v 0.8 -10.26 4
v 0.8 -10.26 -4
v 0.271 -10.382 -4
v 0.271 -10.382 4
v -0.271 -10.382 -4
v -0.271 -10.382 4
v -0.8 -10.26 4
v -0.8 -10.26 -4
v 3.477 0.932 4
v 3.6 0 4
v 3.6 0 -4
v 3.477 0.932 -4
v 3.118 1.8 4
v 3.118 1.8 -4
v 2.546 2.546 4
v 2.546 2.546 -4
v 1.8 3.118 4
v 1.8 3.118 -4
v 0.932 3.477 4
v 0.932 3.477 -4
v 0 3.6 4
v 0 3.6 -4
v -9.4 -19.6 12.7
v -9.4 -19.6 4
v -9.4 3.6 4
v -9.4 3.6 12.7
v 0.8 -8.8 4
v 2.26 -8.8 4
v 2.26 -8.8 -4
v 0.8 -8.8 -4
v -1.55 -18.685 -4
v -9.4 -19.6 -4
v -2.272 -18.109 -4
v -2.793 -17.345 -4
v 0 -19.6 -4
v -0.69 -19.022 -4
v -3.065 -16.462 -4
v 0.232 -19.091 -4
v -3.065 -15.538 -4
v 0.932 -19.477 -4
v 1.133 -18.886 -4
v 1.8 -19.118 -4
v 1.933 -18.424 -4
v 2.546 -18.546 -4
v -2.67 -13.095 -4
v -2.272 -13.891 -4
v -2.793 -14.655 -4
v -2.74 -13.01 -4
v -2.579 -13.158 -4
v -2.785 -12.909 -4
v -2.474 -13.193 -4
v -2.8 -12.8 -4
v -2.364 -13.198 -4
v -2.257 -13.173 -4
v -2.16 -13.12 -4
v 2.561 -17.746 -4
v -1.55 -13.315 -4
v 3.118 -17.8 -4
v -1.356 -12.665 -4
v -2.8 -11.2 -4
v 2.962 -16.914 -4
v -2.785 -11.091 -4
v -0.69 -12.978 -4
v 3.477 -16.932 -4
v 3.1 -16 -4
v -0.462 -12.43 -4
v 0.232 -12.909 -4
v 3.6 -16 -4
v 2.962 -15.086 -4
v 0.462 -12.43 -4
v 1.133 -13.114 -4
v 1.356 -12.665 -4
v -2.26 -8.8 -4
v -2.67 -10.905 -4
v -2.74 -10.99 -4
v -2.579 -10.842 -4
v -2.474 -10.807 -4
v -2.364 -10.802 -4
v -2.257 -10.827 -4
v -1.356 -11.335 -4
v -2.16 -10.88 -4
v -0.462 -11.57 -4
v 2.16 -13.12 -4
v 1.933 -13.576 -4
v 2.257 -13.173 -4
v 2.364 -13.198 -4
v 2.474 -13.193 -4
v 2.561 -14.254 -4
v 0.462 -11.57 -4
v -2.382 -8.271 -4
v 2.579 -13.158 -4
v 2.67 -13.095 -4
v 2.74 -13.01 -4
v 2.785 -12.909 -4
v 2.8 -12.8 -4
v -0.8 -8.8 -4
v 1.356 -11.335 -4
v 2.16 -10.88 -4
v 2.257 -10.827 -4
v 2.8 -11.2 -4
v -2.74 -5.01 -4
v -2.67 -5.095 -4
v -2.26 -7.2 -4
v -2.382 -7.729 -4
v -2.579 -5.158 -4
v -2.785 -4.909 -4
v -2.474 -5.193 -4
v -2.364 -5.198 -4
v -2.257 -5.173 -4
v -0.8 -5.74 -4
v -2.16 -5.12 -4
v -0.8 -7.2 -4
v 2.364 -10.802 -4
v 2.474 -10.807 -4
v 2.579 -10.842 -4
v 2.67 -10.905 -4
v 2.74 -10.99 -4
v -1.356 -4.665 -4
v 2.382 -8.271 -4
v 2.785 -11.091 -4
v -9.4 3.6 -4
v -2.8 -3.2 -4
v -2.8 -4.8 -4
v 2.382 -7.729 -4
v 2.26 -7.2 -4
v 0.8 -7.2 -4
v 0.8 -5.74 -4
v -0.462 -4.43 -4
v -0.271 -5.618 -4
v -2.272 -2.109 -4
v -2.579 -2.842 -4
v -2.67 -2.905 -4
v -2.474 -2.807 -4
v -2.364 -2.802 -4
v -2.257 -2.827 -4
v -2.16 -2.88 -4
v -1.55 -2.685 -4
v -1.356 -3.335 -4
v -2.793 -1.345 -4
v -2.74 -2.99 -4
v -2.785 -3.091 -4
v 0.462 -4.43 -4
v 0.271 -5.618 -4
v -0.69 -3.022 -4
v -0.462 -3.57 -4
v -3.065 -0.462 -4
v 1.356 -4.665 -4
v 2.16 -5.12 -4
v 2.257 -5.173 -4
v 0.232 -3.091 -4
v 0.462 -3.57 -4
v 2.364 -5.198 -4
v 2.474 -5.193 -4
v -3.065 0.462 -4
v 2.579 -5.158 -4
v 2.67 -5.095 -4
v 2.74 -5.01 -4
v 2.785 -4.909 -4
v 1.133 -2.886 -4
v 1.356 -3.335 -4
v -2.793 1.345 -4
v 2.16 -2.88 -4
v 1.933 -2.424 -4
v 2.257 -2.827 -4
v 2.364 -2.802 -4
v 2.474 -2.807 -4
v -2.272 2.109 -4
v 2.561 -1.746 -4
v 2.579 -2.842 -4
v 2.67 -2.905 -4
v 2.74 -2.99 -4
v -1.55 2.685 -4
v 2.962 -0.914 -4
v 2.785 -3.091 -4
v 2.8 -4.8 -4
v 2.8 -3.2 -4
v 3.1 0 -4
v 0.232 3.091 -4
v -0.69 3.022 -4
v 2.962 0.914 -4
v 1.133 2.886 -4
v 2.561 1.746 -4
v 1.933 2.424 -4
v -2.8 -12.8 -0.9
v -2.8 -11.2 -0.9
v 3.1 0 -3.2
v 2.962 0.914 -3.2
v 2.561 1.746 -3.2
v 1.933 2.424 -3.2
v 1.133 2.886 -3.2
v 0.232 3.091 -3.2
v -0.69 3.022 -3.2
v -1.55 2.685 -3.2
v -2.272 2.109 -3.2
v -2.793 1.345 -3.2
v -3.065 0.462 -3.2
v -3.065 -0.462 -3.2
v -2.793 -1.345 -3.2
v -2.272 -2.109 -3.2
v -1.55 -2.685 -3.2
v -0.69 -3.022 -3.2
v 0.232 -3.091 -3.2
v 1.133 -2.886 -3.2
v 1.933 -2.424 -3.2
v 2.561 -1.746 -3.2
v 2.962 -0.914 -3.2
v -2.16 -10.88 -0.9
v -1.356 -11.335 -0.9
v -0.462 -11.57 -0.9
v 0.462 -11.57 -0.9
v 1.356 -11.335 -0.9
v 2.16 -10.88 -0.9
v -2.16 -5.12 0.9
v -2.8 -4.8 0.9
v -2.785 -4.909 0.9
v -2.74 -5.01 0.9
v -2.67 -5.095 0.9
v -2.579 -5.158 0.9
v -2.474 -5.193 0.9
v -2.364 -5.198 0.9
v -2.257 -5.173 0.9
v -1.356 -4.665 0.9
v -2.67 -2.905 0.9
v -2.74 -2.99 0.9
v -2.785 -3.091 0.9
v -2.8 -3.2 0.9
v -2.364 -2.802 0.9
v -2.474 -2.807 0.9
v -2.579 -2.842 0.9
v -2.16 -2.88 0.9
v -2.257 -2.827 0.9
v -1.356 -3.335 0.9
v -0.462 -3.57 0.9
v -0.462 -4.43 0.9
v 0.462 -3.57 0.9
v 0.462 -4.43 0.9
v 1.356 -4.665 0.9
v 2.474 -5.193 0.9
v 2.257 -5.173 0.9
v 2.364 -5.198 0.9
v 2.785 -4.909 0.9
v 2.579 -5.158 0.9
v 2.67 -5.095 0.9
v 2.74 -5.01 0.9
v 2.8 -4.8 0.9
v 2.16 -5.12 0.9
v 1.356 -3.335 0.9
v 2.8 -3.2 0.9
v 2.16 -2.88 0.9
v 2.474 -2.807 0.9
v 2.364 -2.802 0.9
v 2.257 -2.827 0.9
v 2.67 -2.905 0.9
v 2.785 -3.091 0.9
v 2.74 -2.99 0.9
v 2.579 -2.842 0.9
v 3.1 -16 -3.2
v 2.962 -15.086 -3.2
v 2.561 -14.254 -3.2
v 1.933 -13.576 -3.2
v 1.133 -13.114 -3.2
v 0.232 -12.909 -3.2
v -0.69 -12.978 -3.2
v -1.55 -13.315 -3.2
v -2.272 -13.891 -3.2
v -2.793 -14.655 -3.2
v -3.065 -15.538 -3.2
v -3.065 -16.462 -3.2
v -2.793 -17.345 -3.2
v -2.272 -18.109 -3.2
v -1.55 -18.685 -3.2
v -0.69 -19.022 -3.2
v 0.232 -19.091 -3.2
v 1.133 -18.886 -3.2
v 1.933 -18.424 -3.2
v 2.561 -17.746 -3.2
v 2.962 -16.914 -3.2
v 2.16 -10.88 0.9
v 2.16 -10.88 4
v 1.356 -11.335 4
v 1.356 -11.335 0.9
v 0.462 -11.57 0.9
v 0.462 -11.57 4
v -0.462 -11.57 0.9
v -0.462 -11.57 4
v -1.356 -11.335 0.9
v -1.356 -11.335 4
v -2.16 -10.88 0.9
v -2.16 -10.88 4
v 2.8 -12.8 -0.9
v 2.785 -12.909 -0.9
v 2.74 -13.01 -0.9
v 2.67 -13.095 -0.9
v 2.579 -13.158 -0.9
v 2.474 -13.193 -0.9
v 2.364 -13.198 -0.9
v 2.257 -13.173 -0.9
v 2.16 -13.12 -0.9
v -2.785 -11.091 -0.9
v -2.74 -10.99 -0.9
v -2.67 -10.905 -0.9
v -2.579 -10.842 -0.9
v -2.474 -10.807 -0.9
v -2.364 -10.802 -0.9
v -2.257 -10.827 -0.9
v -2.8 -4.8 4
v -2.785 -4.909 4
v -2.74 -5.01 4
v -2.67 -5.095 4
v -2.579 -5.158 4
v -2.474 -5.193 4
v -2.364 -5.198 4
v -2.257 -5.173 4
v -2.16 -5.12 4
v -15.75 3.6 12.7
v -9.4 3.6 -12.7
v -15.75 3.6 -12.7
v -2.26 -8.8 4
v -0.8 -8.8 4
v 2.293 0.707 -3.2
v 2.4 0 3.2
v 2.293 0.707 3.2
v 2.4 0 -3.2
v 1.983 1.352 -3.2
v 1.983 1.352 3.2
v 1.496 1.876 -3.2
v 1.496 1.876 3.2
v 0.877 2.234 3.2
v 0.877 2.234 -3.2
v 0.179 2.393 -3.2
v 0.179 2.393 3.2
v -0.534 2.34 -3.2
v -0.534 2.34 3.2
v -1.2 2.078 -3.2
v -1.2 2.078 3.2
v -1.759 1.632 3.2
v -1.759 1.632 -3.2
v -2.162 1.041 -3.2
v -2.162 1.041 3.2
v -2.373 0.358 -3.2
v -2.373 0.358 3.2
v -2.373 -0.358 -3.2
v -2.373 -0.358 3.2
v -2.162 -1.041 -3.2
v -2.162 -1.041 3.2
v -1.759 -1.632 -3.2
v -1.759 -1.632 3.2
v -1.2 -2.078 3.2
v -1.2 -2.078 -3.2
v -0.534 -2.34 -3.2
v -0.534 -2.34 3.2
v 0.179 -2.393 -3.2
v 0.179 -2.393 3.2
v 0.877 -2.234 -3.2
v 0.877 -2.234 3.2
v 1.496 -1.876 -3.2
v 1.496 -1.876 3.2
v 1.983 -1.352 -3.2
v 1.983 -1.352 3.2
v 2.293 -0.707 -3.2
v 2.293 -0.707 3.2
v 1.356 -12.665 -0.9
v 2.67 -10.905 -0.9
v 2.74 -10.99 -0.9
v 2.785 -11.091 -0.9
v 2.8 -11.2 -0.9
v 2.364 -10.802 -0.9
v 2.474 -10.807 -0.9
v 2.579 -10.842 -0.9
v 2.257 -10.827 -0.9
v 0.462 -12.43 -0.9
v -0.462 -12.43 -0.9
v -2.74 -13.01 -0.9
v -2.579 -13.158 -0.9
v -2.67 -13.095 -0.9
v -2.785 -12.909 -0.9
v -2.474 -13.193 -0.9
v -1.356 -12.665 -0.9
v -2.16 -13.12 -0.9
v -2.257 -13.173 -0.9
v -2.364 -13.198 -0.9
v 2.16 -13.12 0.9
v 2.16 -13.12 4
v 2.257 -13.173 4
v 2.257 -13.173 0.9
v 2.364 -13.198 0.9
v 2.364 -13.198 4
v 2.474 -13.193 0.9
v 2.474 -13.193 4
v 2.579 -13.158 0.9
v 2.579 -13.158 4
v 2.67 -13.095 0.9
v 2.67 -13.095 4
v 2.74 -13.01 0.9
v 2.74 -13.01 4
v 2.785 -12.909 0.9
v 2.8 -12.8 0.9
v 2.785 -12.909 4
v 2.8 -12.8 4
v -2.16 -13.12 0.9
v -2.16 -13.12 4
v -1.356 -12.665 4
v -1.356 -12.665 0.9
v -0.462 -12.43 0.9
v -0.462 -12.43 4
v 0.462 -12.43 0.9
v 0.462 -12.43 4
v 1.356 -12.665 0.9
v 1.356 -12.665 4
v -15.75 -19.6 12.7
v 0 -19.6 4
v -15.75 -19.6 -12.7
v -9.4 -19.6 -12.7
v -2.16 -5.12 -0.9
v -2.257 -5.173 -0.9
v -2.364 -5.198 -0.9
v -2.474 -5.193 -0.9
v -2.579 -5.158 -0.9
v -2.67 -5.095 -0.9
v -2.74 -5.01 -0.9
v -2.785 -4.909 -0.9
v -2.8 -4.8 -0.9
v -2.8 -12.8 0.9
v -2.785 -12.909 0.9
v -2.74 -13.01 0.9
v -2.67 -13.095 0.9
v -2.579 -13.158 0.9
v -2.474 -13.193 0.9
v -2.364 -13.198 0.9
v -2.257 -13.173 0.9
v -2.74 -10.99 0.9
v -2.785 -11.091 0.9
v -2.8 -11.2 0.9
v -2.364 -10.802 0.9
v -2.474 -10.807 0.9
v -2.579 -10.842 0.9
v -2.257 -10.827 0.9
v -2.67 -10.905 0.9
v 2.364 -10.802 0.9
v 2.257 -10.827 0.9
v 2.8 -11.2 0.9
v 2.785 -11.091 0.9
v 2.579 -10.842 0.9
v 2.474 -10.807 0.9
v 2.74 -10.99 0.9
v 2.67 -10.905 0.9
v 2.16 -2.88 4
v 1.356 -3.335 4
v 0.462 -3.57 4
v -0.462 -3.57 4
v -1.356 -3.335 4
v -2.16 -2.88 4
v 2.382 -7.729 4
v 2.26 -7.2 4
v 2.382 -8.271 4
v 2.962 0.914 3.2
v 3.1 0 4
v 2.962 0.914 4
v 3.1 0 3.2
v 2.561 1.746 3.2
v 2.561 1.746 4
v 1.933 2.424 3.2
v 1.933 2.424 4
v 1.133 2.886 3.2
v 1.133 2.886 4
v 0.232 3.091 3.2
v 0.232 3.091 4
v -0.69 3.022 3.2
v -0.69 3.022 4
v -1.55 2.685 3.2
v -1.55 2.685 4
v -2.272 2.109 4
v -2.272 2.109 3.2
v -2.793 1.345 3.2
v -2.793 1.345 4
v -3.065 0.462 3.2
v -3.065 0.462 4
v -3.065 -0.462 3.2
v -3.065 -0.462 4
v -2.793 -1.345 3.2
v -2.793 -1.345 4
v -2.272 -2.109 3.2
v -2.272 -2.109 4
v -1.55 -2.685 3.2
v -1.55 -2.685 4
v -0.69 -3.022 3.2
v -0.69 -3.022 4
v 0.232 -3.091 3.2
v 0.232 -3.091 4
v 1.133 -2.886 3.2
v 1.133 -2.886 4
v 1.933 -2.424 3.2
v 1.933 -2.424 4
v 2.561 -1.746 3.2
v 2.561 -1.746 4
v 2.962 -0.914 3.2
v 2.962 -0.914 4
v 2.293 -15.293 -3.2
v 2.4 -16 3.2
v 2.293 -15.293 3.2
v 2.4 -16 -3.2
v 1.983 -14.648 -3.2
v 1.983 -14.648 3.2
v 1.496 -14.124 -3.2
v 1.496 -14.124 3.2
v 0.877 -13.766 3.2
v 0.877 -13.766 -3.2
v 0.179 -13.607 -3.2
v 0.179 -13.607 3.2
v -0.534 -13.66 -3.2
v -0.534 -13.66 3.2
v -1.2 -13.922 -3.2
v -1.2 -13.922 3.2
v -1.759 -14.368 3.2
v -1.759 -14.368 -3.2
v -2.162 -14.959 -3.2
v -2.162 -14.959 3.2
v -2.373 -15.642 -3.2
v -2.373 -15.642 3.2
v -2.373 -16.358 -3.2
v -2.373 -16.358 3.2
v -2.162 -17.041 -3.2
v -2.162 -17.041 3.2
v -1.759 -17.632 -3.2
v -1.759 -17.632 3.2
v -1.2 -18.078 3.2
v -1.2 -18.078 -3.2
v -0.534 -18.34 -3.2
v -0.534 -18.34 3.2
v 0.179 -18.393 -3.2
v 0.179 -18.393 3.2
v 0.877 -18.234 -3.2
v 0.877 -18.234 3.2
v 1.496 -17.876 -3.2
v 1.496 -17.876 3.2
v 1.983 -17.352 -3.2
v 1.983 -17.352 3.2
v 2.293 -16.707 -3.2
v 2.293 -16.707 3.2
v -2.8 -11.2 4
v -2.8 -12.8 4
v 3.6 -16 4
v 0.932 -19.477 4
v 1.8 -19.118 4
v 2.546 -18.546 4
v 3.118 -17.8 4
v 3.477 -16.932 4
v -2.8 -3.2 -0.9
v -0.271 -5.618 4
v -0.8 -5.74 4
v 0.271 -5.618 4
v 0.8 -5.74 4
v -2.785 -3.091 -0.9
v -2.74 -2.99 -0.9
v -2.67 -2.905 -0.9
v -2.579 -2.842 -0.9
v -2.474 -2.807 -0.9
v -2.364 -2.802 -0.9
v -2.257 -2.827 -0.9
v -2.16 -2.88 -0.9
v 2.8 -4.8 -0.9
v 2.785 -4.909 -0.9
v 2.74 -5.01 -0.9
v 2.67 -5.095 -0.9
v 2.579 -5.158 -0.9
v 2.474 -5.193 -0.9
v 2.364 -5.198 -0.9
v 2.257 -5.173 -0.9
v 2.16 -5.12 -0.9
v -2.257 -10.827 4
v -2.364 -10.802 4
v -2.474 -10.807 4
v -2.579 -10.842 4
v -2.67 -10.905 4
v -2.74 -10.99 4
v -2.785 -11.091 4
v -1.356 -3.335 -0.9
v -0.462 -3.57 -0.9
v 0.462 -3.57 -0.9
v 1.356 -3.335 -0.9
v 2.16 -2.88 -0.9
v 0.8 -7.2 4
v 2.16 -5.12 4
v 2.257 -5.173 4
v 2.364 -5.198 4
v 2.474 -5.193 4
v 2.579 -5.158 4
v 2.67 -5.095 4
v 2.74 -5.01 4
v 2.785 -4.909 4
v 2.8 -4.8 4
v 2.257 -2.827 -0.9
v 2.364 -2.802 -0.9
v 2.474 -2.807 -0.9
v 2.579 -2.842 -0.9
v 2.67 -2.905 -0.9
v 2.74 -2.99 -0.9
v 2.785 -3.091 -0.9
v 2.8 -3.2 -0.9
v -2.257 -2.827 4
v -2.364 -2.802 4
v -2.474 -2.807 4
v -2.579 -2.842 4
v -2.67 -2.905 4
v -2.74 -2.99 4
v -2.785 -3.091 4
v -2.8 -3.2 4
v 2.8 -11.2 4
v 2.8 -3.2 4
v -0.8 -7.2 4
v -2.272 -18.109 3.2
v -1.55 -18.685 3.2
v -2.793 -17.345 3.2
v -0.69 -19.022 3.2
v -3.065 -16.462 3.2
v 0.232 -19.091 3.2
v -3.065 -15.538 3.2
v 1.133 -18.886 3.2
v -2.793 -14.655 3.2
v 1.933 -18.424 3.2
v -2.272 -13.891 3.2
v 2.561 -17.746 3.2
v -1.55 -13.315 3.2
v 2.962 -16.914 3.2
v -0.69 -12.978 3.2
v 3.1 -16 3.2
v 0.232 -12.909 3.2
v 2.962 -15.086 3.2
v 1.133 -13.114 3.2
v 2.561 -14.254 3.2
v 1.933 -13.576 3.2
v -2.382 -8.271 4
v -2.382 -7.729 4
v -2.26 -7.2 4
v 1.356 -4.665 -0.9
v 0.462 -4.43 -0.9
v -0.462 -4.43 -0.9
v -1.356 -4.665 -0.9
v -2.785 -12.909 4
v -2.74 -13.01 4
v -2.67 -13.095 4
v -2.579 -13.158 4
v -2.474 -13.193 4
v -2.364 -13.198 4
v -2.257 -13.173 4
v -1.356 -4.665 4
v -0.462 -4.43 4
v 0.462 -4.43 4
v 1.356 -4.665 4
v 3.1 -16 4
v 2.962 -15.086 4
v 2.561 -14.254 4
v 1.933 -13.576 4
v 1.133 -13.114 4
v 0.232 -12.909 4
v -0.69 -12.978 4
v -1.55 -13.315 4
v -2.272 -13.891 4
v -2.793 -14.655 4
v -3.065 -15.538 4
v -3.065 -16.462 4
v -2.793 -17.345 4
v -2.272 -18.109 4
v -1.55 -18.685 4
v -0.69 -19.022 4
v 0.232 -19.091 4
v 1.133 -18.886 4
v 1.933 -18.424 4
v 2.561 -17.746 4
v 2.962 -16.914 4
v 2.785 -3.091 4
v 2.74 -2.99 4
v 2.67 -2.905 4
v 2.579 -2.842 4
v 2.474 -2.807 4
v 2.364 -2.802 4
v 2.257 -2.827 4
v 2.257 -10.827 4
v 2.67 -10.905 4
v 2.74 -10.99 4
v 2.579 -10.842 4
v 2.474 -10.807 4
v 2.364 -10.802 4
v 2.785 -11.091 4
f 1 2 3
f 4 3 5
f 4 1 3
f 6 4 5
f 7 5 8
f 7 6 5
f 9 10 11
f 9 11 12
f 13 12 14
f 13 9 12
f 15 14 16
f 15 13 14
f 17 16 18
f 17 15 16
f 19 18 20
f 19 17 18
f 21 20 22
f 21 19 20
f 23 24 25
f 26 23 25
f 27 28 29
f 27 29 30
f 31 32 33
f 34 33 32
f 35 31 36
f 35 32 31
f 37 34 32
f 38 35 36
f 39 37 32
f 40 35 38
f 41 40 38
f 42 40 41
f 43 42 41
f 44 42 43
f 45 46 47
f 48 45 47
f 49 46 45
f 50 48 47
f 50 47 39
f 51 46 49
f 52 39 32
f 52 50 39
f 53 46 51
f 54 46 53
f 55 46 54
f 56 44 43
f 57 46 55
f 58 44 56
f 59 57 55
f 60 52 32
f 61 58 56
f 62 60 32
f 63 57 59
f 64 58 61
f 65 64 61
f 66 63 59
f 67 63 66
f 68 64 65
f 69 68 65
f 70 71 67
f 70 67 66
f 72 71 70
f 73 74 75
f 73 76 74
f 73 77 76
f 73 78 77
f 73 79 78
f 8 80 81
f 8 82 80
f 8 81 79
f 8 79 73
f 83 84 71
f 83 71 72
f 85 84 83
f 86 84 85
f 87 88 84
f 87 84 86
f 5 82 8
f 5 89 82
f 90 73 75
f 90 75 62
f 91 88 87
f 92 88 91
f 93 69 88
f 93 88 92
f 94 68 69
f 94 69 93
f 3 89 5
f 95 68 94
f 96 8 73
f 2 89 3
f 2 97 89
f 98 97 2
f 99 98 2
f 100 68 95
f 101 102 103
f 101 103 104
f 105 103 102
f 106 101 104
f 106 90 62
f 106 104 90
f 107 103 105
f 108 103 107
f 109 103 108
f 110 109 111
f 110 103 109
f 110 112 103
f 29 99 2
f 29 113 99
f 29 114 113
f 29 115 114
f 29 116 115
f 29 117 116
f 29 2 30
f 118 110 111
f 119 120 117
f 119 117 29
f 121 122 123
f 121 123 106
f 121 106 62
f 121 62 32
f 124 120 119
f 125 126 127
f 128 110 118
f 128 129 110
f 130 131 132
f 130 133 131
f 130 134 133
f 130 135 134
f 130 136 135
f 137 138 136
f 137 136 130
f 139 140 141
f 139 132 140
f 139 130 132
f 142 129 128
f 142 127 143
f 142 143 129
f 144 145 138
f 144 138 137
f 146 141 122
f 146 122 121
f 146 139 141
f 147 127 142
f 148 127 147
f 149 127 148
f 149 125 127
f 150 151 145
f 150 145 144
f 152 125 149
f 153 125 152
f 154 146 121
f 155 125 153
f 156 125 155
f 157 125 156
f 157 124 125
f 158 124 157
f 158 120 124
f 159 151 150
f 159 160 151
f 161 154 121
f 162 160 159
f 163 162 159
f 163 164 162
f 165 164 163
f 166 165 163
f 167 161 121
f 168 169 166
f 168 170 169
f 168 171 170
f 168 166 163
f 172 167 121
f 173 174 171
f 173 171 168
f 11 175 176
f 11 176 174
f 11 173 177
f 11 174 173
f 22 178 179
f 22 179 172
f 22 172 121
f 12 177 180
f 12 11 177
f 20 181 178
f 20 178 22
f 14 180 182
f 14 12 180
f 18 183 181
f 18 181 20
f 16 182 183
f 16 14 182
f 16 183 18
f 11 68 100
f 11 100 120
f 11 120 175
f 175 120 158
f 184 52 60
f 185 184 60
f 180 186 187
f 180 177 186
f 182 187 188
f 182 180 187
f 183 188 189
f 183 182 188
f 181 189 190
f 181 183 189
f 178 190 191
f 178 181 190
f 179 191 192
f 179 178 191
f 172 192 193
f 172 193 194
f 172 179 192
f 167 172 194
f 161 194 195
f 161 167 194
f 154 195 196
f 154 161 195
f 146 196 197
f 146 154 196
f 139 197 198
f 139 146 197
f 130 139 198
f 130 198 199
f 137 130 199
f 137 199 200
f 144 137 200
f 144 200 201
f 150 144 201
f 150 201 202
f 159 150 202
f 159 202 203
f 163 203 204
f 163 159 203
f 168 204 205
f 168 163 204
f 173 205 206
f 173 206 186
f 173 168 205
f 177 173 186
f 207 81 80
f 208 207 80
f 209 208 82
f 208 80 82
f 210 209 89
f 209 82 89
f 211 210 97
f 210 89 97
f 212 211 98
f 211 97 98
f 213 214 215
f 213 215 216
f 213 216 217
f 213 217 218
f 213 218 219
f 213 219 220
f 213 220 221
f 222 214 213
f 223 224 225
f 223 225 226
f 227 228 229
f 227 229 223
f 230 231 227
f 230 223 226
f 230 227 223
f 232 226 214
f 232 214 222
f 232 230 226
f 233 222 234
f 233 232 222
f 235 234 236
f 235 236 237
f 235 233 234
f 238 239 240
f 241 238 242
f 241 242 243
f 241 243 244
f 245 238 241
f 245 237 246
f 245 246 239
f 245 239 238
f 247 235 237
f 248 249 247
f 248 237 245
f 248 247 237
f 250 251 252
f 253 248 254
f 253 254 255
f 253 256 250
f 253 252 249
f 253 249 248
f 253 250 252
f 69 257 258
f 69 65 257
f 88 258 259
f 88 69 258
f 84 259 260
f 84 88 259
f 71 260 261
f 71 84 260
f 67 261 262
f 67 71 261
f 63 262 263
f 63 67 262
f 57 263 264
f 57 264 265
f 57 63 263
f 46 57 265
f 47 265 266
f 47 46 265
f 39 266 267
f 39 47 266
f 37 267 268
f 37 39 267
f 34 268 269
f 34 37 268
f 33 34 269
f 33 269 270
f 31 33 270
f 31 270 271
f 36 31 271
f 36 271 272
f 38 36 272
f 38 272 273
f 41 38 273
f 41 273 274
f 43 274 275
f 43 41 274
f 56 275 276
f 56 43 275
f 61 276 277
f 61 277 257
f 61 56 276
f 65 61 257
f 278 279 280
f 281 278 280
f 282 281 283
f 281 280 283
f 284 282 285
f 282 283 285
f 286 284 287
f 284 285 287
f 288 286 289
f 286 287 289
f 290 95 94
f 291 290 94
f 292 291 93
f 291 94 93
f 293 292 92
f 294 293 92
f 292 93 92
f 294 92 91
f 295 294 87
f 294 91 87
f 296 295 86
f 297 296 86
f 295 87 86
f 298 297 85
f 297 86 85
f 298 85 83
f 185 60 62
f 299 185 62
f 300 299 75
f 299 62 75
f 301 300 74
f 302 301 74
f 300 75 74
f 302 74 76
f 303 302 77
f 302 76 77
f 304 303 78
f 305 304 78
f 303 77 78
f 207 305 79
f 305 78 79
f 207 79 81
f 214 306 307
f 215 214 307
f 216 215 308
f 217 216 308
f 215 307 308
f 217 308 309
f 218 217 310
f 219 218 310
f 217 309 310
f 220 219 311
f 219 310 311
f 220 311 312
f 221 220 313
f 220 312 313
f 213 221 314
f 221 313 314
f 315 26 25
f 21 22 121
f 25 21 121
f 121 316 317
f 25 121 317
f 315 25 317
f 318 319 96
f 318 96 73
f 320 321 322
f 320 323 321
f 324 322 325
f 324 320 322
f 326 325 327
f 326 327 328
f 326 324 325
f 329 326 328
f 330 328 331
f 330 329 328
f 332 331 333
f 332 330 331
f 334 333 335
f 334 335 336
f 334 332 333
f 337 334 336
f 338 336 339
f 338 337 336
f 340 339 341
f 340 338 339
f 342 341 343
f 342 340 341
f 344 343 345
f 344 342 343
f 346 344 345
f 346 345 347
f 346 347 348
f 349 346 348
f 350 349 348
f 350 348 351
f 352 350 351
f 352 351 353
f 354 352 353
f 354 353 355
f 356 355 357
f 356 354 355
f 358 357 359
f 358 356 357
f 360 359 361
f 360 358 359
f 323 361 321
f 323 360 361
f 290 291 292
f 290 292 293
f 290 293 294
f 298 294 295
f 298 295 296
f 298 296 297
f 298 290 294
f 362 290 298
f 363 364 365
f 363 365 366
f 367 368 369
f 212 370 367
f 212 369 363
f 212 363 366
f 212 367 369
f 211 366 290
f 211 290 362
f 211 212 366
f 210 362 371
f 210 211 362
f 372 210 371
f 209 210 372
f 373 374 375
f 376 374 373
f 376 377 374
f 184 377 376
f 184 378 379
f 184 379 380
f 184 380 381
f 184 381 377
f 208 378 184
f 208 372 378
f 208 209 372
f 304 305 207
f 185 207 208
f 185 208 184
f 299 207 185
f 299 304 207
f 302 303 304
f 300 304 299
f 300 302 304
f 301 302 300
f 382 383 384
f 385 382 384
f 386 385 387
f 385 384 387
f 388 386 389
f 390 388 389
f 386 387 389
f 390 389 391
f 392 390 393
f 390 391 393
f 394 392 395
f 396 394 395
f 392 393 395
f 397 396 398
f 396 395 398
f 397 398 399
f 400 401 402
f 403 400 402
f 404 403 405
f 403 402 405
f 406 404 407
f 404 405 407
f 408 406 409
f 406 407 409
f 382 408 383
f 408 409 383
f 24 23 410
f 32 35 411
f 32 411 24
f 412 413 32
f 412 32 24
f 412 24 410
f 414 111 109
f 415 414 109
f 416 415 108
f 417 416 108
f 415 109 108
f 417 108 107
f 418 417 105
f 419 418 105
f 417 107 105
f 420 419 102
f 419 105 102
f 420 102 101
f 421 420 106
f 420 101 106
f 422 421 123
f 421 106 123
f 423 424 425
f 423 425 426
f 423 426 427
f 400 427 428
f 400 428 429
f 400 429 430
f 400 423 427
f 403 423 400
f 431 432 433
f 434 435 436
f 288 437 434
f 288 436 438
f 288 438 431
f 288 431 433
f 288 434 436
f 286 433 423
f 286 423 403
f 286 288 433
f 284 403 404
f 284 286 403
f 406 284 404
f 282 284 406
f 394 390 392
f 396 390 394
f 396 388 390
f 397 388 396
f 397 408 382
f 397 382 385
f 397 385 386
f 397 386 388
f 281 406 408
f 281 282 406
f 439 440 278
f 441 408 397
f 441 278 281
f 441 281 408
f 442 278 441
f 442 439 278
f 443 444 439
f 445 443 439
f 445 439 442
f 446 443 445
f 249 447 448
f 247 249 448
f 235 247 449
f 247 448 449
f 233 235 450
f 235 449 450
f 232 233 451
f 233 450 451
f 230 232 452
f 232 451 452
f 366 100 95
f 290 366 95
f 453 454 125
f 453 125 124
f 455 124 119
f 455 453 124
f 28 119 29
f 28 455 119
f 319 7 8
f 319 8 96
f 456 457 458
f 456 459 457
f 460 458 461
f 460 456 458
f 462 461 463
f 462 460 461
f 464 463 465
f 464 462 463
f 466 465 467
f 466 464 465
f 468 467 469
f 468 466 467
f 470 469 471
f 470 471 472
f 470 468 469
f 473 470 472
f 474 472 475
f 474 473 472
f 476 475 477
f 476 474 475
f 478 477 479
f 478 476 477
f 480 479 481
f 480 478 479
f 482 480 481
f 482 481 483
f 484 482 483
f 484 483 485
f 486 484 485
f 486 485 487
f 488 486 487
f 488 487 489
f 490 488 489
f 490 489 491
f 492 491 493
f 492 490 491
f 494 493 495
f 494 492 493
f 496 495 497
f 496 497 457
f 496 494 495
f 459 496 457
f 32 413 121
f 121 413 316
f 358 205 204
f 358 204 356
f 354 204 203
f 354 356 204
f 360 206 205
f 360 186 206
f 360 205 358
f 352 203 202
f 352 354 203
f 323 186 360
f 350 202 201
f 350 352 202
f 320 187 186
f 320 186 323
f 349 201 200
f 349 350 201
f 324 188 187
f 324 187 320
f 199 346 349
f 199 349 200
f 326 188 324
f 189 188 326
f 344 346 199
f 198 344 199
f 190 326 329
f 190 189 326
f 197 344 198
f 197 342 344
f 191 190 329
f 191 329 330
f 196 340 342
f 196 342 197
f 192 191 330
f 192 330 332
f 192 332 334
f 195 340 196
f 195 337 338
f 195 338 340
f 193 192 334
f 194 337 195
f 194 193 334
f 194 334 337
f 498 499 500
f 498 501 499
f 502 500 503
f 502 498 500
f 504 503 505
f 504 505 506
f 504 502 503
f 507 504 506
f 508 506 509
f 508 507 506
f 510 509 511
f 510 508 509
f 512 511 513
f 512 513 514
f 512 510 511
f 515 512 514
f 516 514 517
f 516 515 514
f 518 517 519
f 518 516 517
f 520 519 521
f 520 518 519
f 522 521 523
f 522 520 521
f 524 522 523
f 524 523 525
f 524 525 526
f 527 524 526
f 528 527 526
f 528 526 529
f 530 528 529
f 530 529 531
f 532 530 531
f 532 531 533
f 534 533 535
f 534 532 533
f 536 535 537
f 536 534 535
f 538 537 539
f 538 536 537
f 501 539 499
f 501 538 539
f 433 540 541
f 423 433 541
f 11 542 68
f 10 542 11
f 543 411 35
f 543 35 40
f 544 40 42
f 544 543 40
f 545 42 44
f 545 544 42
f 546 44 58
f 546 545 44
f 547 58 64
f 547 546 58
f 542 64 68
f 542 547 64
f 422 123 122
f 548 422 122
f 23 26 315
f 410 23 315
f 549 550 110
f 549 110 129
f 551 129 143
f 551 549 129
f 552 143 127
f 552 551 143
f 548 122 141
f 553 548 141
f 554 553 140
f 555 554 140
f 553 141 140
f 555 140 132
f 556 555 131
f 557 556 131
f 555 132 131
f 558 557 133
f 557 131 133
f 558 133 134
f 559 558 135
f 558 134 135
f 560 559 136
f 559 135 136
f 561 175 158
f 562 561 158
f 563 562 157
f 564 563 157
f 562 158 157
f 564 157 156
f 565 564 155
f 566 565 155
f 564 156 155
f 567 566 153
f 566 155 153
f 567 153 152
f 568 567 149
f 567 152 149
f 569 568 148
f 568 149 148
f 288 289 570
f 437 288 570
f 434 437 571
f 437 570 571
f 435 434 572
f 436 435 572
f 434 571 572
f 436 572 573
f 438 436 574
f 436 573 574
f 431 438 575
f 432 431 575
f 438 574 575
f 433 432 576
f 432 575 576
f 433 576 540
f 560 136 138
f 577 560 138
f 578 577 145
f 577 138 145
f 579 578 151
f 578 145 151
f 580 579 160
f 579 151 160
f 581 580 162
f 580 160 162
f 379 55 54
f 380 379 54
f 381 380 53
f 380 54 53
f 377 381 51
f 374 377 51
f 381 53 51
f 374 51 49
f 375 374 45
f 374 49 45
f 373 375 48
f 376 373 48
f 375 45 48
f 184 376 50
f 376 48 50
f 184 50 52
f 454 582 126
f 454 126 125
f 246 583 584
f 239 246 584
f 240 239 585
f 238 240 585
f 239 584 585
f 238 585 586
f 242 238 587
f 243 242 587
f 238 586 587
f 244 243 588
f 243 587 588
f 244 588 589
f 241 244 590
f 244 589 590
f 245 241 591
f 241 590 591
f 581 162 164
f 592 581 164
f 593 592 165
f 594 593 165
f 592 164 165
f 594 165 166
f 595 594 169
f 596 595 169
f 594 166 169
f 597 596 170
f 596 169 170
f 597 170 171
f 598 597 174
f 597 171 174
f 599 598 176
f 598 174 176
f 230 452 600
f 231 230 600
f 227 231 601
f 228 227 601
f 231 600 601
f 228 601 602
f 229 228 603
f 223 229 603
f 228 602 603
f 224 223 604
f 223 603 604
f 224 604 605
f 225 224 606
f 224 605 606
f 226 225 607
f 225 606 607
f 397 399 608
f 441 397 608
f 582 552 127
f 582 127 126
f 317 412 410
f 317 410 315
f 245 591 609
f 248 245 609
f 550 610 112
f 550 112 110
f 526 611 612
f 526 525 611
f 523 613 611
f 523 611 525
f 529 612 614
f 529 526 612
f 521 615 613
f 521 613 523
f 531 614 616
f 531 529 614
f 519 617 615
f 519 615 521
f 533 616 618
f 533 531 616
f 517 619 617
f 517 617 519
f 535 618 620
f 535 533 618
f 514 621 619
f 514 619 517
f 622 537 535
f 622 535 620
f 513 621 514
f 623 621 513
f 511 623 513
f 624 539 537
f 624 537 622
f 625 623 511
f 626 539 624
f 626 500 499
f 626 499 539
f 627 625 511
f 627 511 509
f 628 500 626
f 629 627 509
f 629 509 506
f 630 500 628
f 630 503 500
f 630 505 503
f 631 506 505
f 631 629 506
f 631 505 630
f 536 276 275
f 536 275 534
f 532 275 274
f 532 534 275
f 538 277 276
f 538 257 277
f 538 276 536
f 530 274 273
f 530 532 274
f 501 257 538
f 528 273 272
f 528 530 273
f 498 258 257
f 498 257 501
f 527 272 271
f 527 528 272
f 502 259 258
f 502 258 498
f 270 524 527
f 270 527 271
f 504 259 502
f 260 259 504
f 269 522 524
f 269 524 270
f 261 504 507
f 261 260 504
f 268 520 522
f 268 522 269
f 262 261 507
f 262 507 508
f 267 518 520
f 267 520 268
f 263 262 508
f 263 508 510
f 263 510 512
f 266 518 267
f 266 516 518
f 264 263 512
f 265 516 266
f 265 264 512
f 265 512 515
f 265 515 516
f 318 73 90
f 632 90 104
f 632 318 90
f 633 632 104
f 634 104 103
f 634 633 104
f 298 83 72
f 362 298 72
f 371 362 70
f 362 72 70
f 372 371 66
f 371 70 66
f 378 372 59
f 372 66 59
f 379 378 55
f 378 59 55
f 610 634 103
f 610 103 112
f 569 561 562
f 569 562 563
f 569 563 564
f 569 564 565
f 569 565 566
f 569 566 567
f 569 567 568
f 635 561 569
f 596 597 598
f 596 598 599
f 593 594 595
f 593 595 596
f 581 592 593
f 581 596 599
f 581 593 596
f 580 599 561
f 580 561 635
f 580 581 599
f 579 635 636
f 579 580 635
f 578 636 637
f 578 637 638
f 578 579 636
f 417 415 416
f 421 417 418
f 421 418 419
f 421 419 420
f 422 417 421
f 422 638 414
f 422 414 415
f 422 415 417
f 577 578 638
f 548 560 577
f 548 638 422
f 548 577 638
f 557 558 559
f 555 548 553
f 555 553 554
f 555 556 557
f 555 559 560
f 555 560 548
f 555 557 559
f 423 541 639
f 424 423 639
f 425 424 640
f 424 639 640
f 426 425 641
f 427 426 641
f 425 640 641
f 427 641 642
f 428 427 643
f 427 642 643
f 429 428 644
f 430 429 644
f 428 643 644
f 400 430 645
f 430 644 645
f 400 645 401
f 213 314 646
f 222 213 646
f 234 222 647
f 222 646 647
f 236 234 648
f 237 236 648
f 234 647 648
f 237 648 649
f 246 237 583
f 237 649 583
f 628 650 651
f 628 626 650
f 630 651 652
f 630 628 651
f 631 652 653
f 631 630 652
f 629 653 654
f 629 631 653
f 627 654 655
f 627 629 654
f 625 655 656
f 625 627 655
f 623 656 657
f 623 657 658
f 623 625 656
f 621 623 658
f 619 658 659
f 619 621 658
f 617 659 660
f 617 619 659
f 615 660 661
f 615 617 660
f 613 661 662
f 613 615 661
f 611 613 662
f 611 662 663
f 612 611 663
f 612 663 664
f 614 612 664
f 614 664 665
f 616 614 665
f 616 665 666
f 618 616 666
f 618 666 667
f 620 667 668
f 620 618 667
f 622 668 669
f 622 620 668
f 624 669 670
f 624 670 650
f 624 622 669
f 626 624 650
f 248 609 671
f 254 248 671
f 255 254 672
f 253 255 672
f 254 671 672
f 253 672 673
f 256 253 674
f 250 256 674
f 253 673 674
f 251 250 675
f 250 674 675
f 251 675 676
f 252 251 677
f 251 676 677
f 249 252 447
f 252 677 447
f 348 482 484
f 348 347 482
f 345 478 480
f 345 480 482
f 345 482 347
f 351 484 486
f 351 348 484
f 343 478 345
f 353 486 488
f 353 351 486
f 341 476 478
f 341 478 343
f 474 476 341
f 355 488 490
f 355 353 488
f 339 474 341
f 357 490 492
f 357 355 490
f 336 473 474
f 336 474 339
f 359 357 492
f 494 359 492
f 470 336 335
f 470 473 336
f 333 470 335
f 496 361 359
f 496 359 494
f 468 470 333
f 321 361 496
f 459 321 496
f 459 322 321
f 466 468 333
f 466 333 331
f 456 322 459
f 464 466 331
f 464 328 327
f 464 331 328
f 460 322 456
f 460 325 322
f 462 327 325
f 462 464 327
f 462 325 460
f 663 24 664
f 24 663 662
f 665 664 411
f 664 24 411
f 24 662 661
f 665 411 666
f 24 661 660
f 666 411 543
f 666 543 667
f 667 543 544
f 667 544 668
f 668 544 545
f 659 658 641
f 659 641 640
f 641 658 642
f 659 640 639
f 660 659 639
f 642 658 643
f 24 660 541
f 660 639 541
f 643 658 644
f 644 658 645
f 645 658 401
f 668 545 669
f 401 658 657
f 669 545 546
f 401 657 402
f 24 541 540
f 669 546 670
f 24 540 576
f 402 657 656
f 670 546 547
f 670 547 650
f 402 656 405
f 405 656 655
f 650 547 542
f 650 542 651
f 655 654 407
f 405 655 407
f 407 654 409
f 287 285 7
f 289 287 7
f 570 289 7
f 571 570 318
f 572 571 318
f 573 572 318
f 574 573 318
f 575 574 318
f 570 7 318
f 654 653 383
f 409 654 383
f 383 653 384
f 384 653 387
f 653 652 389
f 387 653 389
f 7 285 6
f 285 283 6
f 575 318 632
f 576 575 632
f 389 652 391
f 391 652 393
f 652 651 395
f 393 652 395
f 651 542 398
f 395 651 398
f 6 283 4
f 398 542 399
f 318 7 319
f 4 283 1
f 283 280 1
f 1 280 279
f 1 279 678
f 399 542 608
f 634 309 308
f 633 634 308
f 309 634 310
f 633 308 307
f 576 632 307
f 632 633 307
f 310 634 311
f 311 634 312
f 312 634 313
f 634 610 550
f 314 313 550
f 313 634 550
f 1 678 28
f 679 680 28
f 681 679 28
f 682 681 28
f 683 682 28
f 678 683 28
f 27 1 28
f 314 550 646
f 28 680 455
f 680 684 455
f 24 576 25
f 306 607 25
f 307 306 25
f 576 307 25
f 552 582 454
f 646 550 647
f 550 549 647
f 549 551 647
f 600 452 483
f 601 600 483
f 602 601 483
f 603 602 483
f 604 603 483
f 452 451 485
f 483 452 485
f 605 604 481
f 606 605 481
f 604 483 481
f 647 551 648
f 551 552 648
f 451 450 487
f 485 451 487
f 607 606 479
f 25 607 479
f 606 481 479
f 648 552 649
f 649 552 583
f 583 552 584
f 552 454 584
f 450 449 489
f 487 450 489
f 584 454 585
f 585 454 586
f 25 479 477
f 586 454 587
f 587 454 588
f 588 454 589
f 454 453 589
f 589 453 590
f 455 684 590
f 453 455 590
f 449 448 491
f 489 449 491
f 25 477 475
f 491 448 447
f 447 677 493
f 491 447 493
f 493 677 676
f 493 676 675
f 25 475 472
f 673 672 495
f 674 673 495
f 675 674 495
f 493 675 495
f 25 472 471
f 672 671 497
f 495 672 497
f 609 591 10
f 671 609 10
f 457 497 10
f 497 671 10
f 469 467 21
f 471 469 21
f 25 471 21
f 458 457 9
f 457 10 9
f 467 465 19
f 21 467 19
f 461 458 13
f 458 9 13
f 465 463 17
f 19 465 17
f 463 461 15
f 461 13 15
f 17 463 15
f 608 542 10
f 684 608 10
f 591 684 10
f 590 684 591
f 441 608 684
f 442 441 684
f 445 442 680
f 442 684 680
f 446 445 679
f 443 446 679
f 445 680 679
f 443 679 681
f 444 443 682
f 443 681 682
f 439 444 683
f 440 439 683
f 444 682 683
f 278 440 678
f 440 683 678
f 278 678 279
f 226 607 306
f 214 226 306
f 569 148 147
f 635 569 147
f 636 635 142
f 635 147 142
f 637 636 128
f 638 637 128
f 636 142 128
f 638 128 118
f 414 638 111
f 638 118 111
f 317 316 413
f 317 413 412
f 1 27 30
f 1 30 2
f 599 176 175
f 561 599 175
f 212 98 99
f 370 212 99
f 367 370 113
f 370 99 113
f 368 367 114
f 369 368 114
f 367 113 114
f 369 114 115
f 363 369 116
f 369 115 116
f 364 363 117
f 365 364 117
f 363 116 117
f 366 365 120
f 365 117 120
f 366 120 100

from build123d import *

# Parameters (mm, degrees)
BOSS_EXTRUDE1_DEPTH = 8
SKETCH15_W          = 8
SKETCH15_H          = 23.2
BOSS_EXTRUDE2_DEPTH = 15.75
CUT_EXTRUDE2_DEPTH  = 3.1
CUT_EXTRUDE4_DEPTH  = 3.1
CUT_EXTRUDE6_DEPTH  = 3.1
CUT_EXTRUDE7_DEPTH  = 3.1
CUT_EXTRUDE12_DEPTH = 9
SKETCH18_W          = 6.35
SKETCH18_H          = 23.2
BOSS_EXTRUDE3_DEPTH = 12.7


with BuildPart() as part:
    # Sketch1 → Boss-Extrude1 (new body)
    with BuildSketch(Plane.XY.offset(4)):
        with BuildLine():
            Line((-3.6, 0), (-3.6, -16))
            ThreePointArc((-3.6, -16), (0, -19.6), (3.6, -16))
            Line((3.6, -16), (3.6, 0))
            ThreePointArc((3.6, 0), (0, 3.6), (-3.6, 0))
        make_face()
    extrude(amount=-BOSS_EXTRUDE1_DEPTH)

    # Sketch15 → Boss-Extrude2 (add)
    with BuildSketch(Plane.ZY):
        with Locations((0, -8)):
            Rectangle(SKETCH15_W, SKETCH15_H)
    extrude(amount=BOSS_EXTRUDE2_DEPTH)

    # Sketch3 → Cut-Extrude2 (cut)
    with BuildSketch(Plane.XY.offset(4)):
        with BuildLine():
            Line((2.8, -4.8), (2.8, -3.2))
            ThreePointArc((2.8, -3.2), (2.578885438, -2.842229124), (2.16, -2.88))
            ThreePointArc((2.16, -2.88), (0, -3.6), (-2.16, -2.88))
            ThreePointArc((-2.16, -2.88), (-2.578885438, -2.842229124), (-2.8, -3.2))
            Line((-2.8, -3.2), (-2.8, -4.8))
            ThreePointArc((-2.8, -4.8), (-2.578885438, -5.157770876), (-2.16, -5.12))
            ThreePointArc((-2.16, -5.12), (0, -4.4), (2.16, -5.12))
            ThreePointArc((2.16, -5.12), (2.578885438, -5.157770876), (2.8, -4.8))
        make_face()
    extrude(amount=-CUT_EXTRUDE2_DEPTH, mode=Mode.SUBTRACT)

    # Sketch5 → Cut-Extrude4 (cut)
    with BuildSketch(Plane.XY.offset(4)):
        with BuildLine():
            Line((2.8, -12.8), (2.8, -11.2))
            ThreePointArc((2.8, -11.2), (2.578885438, -10.842229124), (2.16, -10.88))
            ThreePointArc((2.16, -10.88), (0, -11.6), (-2.16, -10.88))
            ThreePointArc((-2.16, -10.88), (-2.578885438, -10.842229124), (-2.8, -11.2))
            Line((-2.8, -11.2), (-2.8, -12.8))
            ThreePointArc((-2.8, -12.8), (-2.578885438, -13.157770876), (-2.16, -13.12))
            ThreePointArc((-2.16, -13.12), (0, -12.4), (2.16, -13.12))
            ThreePointArc((2.16, -13.12), (2.578885438, -13.157770876), (2.8, -12.8))
        make_face()
    extrude(amount=-CUT_EXTRUDE4_DEPTH, mode=Mode.SUBTRACT)

    # Sketch7 → Cut-Extrude6 (cut)
    with BuildSketch(Plane(origin=(0, 0, -4), x_dir=(-1, 0, 0), z_dir=(0, 0, -1))):
        with BuildLine():
            Line((2.8, -4.8), (2.8, -3.2))
            ThreePointArc((2.8, -3.2), (2.578885438, -2.842229124), (2.16, -2.88))
            ThreePointArc((2.16, -2.88), (0, -3.6), (-2.16, -2.88))
            ThreePointArc((-2.16, -2.88), (-2.578885438, -2.842229124), (-2.8, -3.2))
            Line((-2.8, -3.2), (-2.8, -4.8))
            ThreePointArc((-2.8, -4.8), (-2.578885438, -5.157770876), (-2.16, -5.12))
            ThreePointArc((-2.16, -5.12), (0, -4.4), (2.16, -5.12))
            ThreePointArc((2.16, -5.12), (2.578885438, -5.157770876), (2.8, -4.8))
        make_face()
    extrude(amount=-CUT_EXTRUDE6_DEPTH, mode=Mode.SUBTRACT)

    # Sketch8 → Cut-Extrude7 (cut)
    with BuildSketch(Plane(origin=(0, 0, -4), x_dir=(-1, 0, 0), z_dir=(0, 0, -1))):
        with BuildLine():
            Line((-2.8, -11.2), (-2.8, -12.8))
            ThreePointArc((-2.8, -12.8), (-2.578885438, -13.157770876), (-2.16, -13.12))
            ThreePointArc((-2.16, -13.12), (0, -12.4), (2.16, -13.12))
            ThreePointArc((2.16, -13.12), (2.578885438, -13.157770876), (2.8, -12.8))
            Line((2.8, -12.8), (2.8, -11.2))
            ThreePointArc((2.8, -11.2), (2.578885438, -10.842229124), (2.16, -10.88))
            ThreePointArc((2.16, -10.88), (0, -11.6), (-2.16, -10.88))
            ThreePointArc((-2.16, -10.88), (-2.578885438, -10.842229124), (-2.8, -11.2))
        make_face()
    extrude(amount=-CUT_EXTRUDE7_DEPTH, mode=Mode.SUBTRACT)

    # Sketch10 → Cut-Revolve1 (revolve, cut)
    with BuildSketch(Plane(origin=(0, -16, 0), x_dir=(1, 0, 0), z_dir=(0, 1, 0))):
        Polygon((3.1, 4), (0, 4), (0, -4), (3.1, -4), (3.1, -3.2), (2.4, -3.2), (2.4, 3.2), (3.1, 3.2), align=None)
    revolve(axis=Axis((0, -16, -4), (0, 0, 1)), mode=Mode.SUBTRACT)

    # Sketch13 → Cut-Revolve4 (revolve, cut)
    with BuildSketch(Plane(origin=(0, 0, 0), x_dir=(1, 0, 0), z_dir=(0, 1, 0))):
        Polygon((3.1, 4), (0, 4), (0, -4), (3.1, -4), (3.1, -3.2), (2.4, -3.2), (2.4, 3.2), (3.1, 3.2), align=None)
    revolve(axis=Axis((0, 0, -4), (0, 0, 1)), mode=Mode.SUBTRACT)

    # Sketch14 → Cut-Extrude12 (cut, through all)
    with BuildSketch(Plane.XY.offset(4)):
        with BuildLine():
            ThreePointArc((-2.26, -8.8), (-2.3972583, -8), (-2.26, -7.2))
            Line((-2.26, -7.2), (-0.8, -7.2))
            Line((-0.8, -7.2), (-0.8, -5.74))
            ThreePointArc((-0.8, -5.74), (0, -5.6027417), (0.8, -5.74))
            Line((0.8, -5.74), (0.8, -7.2))
            Line((0.8, -7.2), (2.26, -7.2))
            ThreePointArc((2.26, -7.2), (2.3972583, -8), (2.26, -8.8))
            Line((2.26, -8.8), (0.8, -8.8))
            Line((0.8, -8.8), (0.8, -10.26))
            ThreePointArc((0.8, -10.26), (0, -10.3972583), (-0.8, -10.26))
            Line((-0.8, -10.26), (-0.8, -8.8))
            Line((-0.8, -8.8), (-2.26, -8.8))
        make_face()
    extrude(amount=-CUT_EXTRUDE12_DEPTH, mode=Mode.SUBTRACT)

    # Sketch18 → Boss-Extrude3 (add, symmetric)
    with BuildSketch(Plane(origin=(0, 0, 0), x_dir=(-1, 0, 0), z_dir=(0, 0, -1))):
        with Locations((12.575, -8)):
            Rectangle(SKETCH18_W, SKETCH18_H)
    extrude(amount=BOSS_EXTRUDE3_DEPTH, both=True)


solid = part.part
